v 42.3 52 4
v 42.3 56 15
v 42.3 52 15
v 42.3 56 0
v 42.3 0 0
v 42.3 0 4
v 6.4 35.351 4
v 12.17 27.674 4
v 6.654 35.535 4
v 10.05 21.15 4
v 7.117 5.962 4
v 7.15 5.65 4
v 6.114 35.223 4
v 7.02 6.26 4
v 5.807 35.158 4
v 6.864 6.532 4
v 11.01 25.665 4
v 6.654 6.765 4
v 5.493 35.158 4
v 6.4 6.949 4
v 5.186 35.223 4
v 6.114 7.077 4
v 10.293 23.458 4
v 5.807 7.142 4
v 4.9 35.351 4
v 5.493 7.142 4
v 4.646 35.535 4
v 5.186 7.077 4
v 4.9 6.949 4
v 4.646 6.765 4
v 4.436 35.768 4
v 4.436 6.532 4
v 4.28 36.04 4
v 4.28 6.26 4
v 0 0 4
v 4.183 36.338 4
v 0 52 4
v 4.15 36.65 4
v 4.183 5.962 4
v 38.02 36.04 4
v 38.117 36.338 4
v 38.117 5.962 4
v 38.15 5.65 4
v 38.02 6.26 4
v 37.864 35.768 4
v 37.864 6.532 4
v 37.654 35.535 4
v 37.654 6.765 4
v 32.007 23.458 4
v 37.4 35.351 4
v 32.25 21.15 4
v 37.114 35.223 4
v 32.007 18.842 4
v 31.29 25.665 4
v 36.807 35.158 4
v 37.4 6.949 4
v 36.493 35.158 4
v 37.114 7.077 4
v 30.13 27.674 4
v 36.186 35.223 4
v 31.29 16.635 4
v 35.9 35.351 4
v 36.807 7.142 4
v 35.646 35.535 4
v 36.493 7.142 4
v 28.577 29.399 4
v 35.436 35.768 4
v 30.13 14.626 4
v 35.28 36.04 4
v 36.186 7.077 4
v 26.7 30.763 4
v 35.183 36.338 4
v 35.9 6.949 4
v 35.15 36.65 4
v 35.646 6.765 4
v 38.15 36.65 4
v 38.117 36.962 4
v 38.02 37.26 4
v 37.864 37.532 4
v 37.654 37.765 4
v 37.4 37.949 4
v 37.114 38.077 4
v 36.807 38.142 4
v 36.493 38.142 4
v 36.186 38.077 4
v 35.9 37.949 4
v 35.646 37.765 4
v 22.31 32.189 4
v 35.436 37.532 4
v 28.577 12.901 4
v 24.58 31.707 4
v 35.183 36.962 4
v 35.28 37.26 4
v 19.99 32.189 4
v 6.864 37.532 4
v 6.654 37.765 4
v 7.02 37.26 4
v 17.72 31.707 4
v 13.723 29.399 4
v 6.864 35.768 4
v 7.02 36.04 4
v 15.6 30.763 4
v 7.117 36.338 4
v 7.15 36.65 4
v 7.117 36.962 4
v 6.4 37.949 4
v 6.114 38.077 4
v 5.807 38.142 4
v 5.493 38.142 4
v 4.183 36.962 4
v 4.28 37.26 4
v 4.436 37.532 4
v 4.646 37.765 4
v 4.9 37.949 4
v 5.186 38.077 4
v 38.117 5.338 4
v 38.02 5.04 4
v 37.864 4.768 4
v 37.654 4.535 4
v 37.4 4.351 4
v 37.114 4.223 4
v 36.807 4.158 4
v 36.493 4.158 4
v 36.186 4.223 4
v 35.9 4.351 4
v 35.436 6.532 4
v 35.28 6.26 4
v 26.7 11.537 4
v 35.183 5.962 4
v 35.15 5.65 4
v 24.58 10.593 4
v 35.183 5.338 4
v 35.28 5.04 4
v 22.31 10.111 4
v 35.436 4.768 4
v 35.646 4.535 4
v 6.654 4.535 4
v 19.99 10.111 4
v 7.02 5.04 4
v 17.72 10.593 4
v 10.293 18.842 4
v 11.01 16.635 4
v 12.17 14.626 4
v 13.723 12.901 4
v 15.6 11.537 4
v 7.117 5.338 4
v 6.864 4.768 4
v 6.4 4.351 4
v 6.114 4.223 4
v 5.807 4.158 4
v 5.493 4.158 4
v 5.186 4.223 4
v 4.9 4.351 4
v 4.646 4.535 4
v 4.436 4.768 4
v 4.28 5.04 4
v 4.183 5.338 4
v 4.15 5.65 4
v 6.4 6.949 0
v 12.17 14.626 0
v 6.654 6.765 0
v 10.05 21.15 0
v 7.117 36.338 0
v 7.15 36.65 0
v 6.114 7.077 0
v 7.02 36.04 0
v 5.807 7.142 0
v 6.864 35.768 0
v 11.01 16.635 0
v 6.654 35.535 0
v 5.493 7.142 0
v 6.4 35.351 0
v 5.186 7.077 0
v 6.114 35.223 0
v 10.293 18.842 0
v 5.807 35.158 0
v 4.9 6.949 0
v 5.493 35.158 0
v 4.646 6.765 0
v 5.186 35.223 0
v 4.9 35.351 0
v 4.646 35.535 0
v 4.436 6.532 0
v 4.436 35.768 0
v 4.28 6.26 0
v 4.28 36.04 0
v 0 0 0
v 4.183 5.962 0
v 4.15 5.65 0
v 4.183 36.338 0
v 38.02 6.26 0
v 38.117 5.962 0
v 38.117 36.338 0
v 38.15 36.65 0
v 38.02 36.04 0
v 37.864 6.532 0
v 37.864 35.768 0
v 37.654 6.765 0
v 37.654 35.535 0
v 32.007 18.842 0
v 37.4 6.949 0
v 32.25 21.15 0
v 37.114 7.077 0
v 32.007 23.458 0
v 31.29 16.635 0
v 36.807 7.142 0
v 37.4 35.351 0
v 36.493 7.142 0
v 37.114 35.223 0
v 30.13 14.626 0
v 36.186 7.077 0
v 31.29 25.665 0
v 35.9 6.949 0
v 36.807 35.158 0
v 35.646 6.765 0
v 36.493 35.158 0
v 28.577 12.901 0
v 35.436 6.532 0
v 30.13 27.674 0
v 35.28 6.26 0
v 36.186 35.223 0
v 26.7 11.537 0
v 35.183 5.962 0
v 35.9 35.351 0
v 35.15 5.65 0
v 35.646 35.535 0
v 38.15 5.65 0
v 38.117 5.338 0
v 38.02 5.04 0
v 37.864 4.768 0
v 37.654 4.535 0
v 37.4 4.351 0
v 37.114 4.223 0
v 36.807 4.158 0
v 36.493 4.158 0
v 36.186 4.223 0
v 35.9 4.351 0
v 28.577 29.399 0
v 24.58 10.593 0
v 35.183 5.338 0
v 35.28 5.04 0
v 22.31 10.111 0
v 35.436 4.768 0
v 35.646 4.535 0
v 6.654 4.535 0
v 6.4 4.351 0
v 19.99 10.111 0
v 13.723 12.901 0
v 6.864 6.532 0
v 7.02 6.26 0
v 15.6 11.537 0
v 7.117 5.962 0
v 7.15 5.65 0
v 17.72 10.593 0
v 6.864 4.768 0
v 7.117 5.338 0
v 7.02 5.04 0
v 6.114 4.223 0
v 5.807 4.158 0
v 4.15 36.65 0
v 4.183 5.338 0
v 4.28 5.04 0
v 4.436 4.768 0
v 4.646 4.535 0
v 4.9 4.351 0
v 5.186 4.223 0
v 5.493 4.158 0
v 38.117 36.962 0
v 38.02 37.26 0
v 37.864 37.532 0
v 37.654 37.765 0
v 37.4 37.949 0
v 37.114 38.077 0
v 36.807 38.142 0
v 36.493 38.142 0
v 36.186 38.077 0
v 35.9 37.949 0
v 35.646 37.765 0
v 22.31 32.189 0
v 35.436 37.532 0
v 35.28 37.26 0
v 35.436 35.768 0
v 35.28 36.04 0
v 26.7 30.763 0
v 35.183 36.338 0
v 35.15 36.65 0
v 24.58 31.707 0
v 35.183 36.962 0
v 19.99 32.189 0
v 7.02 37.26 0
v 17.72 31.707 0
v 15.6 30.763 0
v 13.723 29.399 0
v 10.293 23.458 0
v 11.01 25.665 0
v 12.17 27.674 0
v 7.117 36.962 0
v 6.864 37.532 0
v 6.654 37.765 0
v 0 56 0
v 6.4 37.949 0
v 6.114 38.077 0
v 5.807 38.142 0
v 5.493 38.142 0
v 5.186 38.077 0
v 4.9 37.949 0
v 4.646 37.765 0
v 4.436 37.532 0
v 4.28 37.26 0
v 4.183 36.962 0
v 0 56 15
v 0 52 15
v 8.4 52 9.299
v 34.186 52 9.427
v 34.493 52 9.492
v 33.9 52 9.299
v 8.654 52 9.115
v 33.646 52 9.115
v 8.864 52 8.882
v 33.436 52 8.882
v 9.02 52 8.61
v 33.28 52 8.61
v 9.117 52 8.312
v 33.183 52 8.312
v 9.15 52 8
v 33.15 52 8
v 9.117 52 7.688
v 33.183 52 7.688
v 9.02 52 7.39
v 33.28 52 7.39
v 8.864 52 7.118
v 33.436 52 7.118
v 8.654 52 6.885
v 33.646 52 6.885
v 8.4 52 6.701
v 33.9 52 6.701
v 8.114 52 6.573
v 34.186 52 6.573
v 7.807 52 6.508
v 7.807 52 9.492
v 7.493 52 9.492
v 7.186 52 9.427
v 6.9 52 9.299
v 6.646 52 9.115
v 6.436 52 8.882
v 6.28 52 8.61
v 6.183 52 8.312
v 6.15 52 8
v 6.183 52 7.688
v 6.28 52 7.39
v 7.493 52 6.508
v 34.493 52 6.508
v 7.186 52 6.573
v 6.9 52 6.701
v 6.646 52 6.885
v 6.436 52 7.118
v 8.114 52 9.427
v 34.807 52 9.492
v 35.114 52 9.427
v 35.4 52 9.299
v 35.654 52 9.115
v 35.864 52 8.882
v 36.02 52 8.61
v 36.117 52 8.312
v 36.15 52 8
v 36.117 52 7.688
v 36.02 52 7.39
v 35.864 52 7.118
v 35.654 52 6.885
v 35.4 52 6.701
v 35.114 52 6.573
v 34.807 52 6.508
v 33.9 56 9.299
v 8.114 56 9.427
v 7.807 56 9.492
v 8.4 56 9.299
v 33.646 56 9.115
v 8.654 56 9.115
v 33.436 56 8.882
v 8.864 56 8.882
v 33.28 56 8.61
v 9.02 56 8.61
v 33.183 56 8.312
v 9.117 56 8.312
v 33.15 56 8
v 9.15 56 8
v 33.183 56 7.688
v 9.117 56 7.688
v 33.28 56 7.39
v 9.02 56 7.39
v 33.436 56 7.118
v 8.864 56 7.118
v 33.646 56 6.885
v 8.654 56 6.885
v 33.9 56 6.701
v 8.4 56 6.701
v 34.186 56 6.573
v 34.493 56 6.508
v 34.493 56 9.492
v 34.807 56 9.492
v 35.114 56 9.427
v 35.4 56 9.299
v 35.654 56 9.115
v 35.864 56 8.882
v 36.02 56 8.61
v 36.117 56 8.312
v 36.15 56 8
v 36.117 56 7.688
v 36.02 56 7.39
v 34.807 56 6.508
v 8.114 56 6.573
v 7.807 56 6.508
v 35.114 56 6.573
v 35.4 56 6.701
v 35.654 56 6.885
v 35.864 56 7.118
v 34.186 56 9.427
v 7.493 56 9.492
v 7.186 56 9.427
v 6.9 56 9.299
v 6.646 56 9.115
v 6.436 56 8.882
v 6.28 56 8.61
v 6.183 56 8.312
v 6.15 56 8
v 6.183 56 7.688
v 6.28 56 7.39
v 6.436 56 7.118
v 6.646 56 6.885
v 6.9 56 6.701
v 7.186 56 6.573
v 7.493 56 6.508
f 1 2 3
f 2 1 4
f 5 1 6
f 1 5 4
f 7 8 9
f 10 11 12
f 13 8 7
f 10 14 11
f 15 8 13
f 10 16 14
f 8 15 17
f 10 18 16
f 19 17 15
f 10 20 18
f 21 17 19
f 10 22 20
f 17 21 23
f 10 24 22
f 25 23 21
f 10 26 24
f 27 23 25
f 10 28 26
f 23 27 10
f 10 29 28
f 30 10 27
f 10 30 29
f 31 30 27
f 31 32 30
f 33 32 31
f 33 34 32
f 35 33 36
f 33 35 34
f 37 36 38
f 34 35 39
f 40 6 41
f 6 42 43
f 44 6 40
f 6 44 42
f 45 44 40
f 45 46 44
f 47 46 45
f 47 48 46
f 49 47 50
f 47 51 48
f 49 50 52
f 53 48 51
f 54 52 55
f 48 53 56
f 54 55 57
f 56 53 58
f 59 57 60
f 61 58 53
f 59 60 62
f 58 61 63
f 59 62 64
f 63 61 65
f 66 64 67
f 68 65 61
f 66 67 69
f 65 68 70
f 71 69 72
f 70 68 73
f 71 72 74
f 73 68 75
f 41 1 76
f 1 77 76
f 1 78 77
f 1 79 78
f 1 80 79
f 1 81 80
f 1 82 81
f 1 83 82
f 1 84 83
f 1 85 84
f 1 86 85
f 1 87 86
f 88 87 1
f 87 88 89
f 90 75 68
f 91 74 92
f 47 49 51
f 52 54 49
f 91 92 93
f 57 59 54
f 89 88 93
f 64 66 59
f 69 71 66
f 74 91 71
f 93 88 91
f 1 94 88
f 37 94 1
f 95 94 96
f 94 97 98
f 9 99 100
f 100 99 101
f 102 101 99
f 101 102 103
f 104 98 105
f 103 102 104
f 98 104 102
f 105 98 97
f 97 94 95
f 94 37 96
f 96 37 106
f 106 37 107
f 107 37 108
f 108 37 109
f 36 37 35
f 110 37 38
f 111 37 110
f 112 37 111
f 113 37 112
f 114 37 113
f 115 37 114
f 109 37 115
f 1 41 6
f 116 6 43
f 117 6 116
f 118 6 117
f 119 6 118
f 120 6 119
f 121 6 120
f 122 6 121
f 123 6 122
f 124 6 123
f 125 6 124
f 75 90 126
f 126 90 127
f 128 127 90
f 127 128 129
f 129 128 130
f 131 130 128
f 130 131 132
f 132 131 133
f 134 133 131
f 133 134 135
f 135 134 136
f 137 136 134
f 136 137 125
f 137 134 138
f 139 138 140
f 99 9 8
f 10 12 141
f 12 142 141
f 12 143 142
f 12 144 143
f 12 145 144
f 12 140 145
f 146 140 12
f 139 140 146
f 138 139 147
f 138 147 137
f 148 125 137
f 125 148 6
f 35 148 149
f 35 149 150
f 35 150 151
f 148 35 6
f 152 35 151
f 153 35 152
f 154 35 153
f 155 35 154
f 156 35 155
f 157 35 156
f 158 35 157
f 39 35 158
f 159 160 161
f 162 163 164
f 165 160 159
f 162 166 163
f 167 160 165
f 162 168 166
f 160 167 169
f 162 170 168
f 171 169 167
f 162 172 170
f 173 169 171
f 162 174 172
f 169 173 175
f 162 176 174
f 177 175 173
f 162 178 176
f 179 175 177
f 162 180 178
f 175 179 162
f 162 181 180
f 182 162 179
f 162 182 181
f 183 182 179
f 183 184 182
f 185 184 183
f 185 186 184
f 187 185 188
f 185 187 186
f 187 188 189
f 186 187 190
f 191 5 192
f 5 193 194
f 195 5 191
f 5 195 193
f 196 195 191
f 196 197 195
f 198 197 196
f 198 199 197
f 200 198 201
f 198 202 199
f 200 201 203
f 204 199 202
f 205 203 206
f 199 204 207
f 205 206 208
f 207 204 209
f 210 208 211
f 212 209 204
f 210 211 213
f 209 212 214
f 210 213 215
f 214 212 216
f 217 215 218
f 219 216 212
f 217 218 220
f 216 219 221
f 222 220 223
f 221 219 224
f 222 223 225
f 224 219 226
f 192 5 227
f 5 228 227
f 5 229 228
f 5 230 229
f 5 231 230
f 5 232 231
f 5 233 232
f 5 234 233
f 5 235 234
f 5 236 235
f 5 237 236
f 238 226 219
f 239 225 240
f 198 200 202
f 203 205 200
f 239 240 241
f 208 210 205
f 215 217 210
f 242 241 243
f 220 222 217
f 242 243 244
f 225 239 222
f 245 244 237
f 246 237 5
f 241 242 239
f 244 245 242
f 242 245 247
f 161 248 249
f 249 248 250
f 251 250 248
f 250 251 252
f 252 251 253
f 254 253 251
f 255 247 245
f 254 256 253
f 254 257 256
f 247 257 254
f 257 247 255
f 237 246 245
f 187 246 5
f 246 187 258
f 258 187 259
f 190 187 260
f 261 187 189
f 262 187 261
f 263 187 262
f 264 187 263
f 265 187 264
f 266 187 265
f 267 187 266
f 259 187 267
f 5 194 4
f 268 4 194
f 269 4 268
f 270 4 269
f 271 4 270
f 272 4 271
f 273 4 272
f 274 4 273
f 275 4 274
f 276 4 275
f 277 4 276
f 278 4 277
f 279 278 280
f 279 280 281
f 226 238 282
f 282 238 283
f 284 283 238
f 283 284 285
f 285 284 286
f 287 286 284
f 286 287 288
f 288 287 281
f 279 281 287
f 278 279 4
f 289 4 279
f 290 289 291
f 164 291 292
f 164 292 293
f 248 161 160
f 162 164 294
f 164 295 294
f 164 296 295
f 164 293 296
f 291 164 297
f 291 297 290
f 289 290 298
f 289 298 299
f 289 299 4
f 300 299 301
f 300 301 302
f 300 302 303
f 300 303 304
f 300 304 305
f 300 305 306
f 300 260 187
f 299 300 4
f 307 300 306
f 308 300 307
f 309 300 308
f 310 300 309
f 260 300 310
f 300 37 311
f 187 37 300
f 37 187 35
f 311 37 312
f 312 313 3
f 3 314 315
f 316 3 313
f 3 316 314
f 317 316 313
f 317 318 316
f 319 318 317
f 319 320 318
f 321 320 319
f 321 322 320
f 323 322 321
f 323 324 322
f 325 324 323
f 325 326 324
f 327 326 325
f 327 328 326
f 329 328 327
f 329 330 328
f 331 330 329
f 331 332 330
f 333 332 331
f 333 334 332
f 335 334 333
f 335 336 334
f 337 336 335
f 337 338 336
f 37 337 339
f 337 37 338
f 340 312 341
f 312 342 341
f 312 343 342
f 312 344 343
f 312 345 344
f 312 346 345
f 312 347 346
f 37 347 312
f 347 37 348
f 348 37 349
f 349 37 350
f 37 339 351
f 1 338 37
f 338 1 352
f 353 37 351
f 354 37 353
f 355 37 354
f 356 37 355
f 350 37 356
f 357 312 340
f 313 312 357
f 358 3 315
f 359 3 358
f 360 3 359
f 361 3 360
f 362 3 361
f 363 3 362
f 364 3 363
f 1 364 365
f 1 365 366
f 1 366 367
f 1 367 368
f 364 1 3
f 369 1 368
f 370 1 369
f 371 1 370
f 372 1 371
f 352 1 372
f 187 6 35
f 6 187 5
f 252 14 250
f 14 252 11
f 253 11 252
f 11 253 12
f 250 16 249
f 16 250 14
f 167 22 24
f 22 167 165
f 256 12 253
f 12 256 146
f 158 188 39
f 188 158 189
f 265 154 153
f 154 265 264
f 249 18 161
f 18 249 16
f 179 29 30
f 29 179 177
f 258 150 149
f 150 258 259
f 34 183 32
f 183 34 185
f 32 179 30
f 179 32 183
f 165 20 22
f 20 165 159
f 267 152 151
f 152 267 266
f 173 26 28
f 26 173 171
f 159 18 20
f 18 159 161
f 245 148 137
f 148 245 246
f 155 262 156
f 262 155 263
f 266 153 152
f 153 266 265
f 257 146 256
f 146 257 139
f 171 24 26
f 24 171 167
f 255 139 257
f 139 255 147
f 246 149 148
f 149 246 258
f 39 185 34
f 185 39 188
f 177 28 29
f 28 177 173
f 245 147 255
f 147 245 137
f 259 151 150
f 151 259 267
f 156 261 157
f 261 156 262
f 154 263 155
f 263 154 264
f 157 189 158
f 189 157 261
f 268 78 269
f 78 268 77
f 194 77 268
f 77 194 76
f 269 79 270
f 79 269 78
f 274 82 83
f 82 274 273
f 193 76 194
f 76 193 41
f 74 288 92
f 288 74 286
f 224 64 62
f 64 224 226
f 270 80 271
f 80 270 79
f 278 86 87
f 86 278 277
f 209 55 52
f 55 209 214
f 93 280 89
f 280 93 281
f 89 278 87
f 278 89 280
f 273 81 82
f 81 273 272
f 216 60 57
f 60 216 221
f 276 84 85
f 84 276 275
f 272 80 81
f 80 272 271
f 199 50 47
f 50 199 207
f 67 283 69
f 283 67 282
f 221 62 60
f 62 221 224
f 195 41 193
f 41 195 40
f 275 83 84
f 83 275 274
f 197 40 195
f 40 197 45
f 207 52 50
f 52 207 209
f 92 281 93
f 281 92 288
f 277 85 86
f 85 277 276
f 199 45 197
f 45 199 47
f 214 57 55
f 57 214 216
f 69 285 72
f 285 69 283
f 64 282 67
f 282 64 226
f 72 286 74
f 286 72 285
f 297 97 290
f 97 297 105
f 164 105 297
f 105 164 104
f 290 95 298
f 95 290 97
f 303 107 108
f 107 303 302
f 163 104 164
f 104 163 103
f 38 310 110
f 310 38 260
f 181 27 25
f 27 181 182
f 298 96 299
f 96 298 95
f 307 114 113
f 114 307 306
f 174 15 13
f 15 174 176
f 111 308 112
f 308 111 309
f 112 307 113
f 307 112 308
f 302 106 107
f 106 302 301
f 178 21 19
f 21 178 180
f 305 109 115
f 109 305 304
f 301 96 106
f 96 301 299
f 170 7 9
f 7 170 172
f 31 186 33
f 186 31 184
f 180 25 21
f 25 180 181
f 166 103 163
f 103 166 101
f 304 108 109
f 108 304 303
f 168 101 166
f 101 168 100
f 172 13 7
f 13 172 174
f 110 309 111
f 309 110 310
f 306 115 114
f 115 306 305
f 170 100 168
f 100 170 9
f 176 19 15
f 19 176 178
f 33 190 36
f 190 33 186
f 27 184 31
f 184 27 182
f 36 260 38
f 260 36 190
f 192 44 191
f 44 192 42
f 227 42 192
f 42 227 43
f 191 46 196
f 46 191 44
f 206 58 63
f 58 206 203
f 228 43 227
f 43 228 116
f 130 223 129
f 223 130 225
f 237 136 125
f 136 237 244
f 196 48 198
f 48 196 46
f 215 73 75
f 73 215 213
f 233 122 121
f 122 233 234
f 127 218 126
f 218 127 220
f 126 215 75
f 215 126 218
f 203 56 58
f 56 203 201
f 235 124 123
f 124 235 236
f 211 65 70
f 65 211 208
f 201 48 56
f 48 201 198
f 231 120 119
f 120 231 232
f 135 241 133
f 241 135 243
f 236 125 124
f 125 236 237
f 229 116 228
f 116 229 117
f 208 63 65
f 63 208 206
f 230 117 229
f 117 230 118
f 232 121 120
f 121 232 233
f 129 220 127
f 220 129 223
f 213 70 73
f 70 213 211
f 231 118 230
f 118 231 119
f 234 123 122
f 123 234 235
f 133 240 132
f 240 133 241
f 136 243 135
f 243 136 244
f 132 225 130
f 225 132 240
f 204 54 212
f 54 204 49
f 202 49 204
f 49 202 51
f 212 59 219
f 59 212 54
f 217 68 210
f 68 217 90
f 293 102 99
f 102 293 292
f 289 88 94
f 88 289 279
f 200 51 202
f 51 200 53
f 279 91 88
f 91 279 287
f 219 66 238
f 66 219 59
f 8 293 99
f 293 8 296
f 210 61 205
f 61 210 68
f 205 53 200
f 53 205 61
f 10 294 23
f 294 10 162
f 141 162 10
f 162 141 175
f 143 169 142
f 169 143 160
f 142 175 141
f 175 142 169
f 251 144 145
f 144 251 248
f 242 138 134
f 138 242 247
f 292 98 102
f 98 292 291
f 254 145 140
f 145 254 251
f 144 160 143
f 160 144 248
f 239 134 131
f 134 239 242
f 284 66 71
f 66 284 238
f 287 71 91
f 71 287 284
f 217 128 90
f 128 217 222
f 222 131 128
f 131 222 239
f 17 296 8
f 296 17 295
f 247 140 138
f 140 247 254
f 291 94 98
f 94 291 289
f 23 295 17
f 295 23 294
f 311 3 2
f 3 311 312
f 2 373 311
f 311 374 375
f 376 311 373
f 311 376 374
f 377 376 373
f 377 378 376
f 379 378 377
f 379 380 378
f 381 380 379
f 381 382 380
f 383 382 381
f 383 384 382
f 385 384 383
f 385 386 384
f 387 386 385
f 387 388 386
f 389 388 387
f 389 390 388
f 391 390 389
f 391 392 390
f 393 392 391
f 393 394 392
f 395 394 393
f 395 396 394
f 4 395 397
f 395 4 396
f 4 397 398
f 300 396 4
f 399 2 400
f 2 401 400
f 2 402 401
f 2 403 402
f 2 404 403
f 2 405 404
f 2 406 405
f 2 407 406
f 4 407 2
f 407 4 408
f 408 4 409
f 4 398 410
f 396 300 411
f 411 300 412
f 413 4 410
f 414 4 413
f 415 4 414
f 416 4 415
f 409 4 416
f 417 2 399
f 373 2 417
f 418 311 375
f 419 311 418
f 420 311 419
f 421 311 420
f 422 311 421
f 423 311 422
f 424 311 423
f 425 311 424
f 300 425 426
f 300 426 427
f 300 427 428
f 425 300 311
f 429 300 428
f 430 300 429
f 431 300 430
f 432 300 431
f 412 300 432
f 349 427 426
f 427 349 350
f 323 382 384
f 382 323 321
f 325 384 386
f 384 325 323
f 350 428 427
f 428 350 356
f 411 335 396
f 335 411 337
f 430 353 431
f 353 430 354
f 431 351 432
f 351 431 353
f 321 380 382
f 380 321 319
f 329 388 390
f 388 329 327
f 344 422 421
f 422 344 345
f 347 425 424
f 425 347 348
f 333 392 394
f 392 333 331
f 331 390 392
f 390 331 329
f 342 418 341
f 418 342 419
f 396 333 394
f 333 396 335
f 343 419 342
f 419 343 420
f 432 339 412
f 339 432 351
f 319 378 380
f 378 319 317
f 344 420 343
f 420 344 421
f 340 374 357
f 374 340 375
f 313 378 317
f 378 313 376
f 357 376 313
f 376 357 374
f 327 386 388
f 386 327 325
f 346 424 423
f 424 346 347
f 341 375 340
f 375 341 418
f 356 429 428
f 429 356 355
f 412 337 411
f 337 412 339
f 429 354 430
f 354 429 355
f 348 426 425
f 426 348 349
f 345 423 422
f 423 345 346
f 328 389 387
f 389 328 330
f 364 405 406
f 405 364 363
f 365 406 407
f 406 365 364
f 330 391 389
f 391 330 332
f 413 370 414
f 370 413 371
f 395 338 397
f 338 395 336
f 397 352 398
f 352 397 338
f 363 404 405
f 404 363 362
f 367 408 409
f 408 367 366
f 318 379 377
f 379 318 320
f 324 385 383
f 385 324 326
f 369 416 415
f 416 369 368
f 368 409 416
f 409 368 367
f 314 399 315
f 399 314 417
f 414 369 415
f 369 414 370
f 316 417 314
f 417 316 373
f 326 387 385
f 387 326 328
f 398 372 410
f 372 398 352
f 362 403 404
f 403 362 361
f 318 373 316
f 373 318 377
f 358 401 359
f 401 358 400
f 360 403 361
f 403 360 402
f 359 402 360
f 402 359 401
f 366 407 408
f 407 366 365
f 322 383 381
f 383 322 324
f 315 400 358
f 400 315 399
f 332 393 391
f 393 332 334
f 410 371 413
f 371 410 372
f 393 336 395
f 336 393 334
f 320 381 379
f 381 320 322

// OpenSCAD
$fn = 30;


difference(){
    cube([42.3,52,4]);
    translate([11.3/2,11.3/2,-0.5]) cylinder(r=1.5,h=5);
    translate([11.3/2 + 31,11.3/2 + 31,-0.5]) cylinder(r=1.5,h=5);
    translate([11.3/2,11.3/2 + 31,-0.5]) cylinder(r=1.5,h=5);
    translate([11.3/2 + 31,11.3/2,-0.5]) cylinder(r=1.5,h=5);
    translate([42.3 / 2,42.3 / 2,-0.5]) cylinder(r=11.1,h=5);
}

difference(){
    translate([0,52,0]) cube([42.3,4,15]);
    translate([11.3/2 + 2,56.5,8]) rotate(a = 90, v = [1,0,0]) cylinder(r=1.5,h=5);
    translate([11.3/2 + 29,56.5,8]) rotate(a = 90, v = [1,0,0]) cylinder(r=1.5,h=5);
}
